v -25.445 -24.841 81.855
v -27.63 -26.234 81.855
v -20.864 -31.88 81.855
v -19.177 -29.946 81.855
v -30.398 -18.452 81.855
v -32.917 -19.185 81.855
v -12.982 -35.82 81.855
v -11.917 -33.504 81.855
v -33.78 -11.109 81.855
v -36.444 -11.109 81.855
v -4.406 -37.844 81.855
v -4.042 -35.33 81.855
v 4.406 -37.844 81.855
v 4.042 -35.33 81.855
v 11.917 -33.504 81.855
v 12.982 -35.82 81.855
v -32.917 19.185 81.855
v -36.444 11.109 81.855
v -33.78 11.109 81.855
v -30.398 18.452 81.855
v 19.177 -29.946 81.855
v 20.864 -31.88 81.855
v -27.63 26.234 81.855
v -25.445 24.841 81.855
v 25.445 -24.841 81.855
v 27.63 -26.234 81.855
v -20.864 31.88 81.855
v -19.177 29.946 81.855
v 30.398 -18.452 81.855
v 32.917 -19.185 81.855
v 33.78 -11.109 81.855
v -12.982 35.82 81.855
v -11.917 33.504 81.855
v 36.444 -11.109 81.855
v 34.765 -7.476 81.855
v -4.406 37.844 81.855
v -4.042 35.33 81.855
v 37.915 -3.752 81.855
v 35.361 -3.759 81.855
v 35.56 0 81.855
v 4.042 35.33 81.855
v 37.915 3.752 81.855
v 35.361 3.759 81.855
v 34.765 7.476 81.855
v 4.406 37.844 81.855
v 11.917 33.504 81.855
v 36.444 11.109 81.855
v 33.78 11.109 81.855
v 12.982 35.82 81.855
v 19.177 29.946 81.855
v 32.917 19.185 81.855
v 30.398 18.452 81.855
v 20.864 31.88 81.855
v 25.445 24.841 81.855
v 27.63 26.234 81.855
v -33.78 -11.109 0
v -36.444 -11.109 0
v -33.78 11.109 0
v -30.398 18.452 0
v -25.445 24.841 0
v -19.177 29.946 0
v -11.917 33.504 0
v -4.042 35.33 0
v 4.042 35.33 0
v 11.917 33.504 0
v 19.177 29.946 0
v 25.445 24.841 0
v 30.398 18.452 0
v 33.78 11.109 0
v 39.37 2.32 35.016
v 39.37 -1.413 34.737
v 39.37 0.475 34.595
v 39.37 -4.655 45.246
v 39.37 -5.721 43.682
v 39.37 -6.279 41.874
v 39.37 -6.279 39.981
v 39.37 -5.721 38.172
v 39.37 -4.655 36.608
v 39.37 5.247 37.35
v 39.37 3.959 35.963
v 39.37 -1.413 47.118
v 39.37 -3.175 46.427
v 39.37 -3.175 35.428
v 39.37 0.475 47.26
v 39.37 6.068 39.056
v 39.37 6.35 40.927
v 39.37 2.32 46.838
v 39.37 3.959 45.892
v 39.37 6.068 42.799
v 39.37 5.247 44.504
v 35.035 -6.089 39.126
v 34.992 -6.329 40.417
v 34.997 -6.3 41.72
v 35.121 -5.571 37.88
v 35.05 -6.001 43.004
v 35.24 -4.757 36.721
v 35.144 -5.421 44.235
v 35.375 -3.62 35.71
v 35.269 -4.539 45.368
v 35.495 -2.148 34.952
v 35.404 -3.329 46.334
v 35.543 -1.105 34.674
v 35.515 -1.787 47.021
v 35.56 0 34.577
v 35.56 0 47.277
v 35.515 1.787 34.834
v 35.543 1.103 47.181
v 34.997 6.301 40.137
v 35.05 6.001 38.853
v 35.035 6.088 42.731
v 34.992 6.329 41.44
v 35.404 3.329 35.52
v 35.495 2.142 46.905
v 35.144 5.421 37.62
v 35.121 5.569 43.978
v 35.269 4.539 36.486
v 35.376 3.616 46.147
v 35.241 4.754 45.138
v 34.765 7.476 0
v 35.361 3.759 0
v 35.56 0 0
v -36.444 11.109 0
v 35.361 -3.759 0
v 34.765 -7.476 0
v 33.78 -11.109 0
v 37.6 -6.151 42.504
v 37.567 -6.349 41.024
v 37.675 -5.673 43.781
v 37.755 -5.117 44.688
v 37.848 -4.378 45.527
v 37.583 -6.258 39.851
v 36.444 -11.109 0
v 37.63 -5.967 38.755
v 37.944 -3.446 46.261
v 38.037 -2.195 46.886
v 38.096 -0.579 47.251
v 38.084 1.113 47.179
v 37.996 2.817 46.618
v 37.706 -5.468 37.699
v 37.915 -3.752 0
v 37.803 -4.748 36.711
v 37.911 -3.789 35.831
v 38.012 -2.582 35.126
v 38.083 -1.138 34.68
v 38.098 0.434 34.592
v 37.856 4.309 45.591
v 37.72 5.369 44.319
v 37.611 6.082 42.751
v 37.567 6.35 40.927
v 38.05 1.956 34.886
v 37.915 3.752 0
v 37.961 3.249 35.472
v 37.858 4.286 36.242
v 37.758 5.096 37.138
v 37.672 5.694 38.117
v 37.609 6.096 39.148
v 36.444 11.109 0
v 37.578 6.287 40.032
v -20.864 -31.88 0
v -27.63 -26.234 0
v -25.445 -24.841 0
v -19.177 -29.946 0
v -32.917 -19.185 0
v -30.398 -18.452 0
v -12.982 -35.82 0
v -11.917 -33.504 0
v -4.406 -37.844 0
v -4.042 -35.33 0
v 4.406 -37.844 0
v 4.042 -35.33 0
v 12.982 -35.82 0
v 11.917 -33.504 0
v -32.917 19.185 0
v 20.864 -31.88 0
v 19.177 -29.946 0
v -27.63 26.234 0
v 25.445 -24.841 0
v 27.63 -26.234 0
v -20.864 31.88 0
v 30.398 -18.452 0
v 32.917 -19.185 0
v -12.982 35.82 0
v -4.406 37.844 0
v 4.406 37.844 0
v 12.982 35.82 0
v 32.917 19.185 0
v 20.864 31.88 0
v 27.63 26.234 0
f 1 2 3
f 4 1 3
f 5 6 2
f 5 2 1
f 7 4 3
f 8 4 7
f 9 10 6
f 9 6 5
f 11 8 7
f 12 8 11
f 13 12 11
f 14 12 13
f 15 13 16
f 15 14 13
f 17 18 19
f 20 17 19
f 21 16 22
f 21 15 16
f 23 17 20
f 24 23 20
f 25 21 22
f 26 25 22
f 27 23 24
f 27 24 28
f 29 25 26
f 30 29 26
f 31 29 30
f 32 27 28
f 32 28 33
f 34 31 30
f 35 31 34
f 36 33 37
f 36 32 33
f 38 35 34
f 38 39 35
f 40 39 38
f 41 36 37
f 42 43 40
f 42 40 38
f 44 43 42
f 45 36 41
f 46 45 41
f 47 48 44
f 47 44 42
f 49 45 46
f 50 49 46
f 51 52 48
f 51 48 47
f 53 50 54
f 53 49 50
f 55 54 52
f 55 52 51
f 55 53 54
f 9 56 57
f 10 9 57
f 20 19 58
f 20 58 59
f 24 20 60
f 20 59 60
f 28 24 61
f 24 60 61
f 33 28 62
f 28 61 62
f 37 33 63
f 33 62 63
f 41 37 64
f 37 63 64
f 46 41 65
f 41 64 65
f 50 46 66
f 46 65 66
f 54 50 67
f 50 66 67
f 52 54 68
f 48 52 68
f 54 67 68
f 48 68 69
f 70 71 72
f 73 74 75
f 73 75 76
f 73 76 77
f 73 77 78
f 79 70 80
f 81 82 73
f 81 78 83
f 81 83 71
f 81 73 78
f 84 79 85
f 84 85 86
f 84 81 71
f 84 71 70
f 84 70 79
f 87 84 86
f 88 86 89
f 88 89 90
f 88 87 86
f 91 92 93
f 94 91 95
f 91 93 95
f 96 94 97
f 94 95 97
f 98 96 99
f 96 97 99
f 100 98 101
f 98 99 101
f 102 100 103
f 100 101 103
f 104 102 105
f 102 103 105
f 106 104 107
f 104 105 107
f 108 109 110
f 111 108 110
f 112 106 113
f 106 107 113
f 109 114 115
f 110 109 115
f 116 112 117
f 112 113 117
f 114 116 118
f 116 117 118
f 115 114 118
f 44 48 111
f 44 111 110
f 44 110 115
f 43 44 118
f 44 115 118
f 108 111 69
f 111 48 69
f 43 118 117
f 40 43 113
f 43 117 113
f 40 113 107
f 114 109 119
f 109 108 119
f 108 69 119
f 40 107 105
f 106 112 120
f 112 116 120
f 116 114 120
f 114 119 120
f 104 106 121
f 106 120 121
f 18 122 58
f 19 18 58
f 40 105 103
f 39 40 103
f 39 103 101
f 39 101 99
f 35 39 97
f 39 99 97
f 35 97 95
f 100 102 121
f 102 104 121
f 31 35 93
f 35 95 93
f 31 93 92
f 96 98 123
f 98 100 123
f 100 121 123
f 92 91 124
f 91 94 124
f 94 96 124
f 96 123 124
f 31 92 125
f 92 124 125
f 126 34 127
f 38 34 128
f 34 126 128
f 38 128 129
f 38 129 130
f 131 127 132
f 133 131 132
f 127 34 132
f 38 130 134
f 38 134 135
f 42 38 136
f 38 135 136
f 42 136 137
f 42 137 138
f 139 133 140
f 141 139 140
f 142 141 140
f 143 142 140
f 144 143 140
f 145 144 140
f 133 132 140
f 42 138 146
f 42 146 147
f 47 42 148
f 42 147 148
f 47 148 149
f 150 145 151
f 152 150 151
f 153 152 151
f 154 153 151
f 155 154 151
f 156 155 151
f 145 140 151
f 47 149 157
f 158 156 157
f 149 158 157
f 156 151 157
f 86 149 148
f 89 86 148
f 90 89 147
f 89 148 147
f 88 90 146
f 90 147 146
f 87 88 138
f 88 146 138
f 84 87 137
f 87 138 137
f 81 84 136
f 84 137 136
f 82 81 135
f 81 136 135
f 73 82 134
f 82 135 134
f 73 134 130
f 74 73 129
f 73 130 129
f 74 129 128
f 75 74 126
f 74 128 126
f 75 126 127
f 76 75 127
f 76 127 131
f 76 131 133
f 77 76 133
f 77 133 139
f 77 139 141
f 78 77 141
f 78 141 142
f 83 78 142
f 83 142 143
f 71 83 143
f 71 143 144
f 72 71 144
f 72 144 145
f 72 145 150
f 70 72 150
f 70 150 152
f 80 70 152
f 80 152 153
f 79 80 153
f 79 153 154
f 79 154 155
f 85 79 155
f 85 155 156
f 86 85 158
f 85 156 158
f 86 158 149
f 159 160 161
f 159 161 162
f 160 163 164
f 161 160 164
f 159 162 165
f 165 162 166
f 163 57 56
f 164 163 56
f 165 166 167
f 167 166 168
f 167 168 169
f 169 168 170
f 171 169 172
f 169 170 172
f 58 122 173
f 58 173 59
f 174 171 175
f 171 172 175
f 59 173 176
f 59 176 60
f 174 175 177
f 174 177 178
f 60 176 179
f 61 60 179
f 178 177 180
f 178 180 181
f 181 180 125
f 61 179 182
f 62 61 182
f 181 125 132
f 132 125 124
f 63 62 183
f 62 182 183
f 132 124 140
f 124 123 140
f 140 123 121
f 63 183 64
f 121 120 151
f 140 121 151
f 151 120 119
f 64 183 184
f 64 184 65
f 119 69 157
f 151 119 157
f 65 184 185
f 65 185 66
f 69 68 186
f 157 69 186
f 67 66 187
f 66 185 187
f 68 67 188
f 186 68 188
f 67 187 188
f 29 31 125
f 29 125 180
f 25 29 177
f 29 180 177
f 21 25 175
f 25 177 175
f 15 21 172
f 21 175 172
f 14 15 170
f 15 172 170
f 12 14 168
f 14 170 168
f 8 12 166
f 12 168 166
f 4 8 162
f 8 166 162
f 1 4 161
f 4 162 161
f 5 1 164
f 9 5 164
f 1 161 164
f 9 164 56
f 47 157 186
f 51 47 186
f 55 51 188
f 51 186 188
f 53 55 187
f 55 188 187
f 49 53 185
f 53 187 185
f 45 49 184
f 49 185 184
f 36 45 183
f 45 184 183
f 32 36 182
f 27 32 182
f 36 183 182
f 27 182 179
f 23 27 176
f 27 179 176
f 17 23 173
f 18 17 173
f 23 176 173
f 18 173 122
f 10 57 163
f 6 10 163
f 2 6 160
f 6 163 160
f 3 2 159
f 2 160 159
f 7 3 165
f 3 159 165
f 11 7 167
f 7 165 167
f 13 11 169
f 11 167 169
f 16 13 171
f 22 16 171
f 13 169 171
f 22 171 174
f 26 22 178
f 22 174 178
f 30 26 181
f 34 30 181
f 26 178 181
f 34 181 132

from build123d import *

# Parameters (mm, degrees)
F1_DEPTH = 81.8546242
F2_R     = 6.35
F3_DEPTH = 39.37
F4_R     = 35.56
F5_DEPTH = 107.95


# Not quite as in the source:
# - a feature names something its author has since deleted; it is built from what else it names


with BuildPart() as f1:
    # F0 (on Top) → F1 (new body)
    with BuildSketch(Plane.XY):
        with BuildLine():
            Line((33.7800627271, 11.1094987354), (36.4443279242, 11.1094987354))
            ThreePointArc((36.4443279242, 11.1094987354), (0, 38.1), (-36.4443279242, 11.1094987354))
            Line((-36.4443279242, 11.1094987354), (-33.7800627271, 11.1094987354))
            ThreePointArc((-33.7800627271, 11.1094987354), (0, 35.56), (33.7800627271, 11.1094987354))
        make_face()
        with BuildLine():
            ThreePointArc((-36.4443279242, -11.1094987354), (0, -38.1), (36.4443279242, -11.1094987354))
            Line((36.4443279242, -11.1094987354), (33.7800627271, -11.1094987354))
            ThreePointArc((33.7800627271, -11.1094987354), (0, -35.56), (-33.7800627271, -11.1094987354))
            Line((-33.7800627271, -11.1094987354), (-36.4443279242, -11.1094987354))
        make_face()
        with BuildLine():
            Line((36.4443279242, -11.1094987354), (36.4443279242, 11.1094987354))
            Line((36.4443279242, 11.1094987354), (33.7800627271, 11.1094987354))
            ThreePointArc((33.7800627271, 11.1094987354), (35.1121961046, 5.6255919433), (35.56, 0))
            ThreePointArc((35.56, 0), (35.1121961046, -5.6255919433), (33.7800627271, -11.1094987354))
            Line((33.7800627271, -11.1094987354), (36.4443279242, -11.1094987354))
        make_face()
        with BuildLine():
            ThreePointArc((36.4443279242, -11.1094987354), (37.683808817, -5.6160976704), (38.1, 0))
            ThreePointArc((38.1, 0), (37.683808817, 5.6160976704), (36.4443279242, 11.1094987354))
            Line((36.4443279242, 11.1094987354), (36.4443279242, -11.1094987354))
        make_face()
    extrude(amount=F1_DEPTH)

    # F2 (on Right) → F3 (join)
    with BuildSketch(Plane.YZ):
        with Locations((0, 40.9273121)):
            Circle(F2_R)
    extrude(amount=F3_DEPTH)

    # F4 (on Top) → F5 (cut, symmetric)
    with BuildSketch(Plane.XY):
        Circle(F4_R)
    extrude(amount=F5_DEPTH, both=True, mode=Mode.SUBTRACT)


solid = f1.part
